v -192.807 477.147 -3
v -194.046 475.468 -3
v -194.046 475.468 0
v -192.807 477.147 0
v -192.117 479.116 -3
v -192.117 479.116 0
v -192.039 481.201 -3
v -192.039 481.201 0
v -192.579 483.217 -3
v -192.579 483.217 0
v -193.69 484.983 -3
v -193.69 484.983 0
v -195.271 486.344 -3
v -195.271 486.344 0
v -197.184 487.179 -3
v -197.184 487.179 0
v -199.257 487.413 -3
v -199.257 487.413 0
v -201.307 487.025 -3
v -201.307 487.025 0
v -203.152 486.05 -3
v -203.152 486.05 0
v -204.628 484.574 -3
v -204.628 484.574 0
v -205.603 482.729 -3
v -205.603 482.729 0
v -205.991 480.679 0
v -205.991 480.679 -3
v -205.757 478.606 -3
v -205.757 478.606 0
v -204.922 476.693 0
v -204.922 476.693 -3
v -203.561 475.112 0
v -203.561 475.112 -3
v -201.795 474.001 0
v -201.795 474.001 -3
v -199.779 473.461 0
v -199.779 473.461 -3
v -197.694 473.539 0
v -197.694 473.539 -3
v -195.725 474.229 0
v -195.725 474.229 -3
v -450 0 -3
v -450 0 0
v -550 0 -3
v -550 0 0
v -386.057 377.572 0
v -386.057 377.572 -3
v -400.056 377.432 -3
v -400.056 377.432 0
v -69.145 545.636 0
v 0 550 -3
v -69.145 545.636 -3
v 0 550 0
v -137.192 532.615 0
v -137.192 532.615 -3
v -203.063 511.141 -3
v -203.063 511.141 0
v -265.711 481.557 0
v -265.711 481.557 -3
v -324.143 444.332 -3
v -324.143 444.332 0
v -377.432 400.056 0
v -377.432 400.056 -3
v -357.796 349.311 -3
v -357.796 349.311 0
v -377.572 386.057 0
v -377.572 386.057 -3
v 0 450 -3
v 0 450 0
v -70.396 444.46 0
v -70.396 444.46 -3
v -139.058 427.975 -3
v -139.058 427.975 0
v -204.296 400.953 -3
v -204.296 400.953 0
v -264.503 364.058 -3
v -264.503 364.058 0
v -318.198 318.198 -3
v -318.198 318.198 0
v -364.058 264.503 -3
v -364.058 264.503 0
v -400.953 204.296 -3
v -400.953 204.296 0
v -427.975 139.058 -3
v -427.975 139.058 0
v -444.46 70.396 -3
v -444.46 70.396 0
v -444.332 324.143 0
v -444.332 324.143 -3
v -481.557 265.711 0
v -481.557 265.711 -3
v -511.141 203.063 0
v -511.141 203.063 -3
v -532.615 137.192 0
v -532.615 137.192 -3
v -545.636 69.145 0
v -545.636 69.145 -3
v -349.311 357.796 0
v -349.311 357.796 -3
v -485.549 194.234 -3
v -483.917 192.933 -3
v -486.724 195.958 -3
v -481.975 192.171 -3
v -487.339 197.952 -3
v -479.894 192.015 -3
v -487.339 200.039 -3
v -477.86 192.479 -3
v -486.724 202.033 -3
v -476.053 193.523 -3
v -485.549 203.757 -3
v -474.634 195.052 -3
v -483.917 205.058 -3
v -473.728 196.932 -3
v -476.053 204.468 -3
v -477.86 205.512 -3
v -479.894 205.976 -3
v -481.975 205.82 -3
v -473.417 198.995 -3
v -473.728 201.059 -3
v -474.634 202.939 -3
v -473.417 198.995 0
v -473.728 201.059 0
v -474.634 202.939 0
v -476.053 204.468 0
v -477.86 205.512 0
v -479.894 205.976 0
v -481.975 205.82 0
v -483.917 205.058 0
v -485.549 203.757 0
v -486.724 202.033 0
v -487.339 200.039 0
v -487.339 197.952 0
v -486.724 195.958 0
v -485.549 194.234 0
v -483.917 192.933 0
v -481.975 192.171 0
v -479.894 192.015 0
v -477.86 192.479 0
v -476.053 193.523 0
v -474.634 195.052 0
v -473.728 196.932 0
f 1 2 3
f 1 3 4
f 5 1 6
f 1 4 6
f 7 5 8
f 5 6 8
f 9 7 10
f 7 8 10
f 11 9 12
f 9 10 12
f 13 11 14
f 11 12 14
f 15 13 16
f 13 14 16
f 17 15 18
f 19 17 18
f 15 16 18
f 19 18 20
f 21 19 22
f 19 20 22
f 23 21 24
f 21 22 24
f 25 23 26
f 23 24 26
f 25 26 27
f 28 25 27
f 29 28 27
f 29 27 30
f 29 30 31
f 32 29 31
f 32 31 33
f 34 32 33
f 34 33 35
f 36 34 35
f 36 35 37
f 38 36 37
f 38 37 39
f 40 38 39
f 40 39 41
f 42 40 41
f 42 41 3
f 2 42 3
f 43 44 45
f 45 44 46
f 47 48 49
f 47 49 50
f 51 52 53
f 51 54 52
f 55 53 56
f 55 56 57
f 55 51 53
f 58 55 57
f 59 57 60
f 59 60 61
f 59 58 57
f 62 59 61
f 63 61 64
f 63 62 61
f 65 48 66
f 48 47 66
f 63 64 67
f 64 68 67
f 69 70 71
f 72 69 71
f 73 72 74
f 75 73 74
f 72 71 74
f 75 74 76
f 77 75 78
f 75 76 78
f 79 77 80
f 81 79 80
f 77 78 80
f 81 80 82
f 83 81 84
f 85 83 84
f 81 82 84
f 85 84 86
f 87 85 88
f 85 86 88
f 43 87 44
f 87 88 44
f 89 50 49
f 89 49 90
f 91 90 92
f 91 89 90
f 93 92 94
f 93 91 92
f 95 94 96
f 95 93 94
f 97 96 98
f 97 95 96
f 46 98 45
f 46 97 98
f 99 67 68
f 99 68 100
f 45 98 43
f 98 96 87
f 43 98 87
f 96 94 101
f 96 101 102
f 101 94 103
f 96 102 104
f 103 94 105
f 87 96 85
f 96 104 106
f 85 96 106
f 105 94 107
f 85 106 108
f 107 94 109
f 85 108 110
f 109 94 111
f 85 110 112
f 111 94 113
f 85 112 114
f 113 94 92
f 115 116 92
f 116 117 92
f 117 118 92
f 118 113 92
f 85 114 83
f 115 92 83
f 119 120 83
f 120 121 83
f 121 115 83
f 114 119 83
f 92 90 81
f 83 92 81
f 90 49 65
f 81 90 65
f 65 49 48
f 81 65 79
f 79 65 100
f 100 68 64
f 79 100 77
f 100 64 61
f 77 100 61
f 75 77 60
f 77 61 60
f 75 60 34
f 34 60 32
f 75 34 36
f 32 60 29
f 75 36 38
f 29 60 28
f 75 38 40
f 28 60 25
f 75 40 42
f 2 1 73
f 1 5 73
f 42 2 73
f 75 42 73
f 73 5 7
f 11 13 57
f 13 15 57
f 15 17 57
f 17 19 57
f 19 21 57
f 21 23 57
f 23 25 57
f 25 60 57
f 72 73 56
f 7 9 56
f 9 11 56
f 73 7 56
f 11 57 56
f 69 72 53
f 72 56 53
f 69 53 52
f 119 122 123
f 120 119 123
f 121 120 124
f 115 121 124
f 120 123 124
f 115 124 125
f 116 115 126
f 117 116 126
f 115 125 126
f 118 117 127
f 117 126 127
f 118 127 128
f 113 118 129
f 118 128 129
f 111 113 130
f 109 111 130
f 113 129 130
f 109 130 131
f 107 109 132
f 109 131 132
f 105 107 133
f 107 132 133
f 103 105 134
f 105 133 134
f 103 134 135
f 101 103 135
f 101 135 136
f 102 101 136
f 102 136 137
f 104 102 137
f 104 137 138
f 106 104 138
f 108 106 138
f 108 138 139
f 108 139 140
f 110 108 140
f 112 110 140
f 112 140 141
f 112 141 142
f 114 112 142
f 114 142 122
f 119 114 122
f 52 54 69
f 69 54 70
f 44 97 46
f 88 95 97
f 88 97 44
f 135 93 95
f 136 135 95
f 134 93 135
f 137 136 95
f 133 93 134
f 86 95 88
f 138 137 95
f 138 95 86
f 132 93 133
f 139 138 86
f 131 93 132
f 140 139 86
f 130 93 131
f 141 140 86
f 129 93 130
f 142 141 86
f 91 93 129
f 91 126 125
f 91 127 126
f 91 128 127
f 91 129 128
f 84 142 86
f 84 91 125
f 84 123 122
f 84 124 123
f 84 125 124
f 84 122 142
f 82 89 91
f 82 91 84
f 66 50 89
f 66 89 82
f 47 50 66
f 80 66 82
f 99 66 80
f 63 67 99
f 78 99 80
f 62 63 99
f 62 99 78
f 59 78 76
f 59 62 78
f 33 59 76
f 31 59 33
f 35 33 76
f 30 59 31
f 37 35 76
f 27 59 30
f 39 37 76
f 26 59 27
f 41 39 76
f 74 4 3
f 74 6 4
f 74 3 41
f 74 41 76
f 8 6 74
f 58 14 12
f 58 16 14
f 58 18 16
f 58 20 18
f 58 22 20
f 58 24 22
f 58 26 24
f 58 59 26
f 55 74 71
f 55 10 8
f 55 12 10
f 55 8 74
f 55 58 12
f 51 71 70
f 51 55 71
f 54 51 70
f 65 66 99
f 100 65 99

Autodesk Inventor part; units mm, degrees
ref_plane "YZ Plane" through (0, 0, 0) normal (1, 0, 0) x (0, 1, 0)
ref_plane "XZ Plane" through (0, 0, 0) normal (0, 1, 0) x (-1, 0, 0)
ref_plane "XY Plane" through (0, 0, 0) normal (0, 0, 1) x (1, 0, 0)
sketch "Sketch1" plane through (0, 0, 0) normal (0, 0, 1) x (1, 0, 0)
  arc A0 (0, 550) -> (-550, 0) centre (0, 0) ccw
  arc A1 (0, 450) -> (-450, 0) centre (0, 0) ccw
  line L0 (0, 550) -> (0, 450)
  line L1 (-450, 0) -> (-550, 0)
  point P0 (-500, 0)
  point P1 (0, 500)
  dimension "d0" = 1100
  dimension "d1" = 900
extrude "Plate1" add sketch "Sketch1" against normal blind 3
sketch "Sketch2" plane through (0, 0, 0) normal (0, 0, 1) x (1, 0, 0)
  line L0 (-550, 0) -> (-450, 0) projected
  arc A0 (0, 550) -> (-550, 0) centre (0, 0) ccw construction
  circle A1 centre (-480.4174, 198.9954) radius 7
  arc A2 (0, 450) -> (-450, 0) centre (0, 0) ccw construction
  circle A3 centre (0, 0) radius 520 construction
  line L1 (-480.4174, 198.9954) -> (0, 0) construction
  dimension "d17" = 1040
  dimension "d4" = 14
  dimension "d16" = 22.5
extrude "Cut1" cut sketch "Sketch2" against normal through all
pattern_circular "Circular Pattern1" count 2 over 45 about axis through (0, 0, 0) along (0, 0, -1) of "Cut1"
sketch "Sketch3" plane through (0, 0, 0) normal (0, 0, 1) x (1, 0, 0)
  line L0 (-388.9087, 388.9087) -> (-318.1981, 318.1981) construction
  arc A0 (0, 450) -> (-450, 0) centre (0, 0) ccw projected
  arc A1 (0, 550) -> (-550, 0) centre (0, 0) ccw projected
  line L1 (-550, 0) -> (-450, 0) projected
  line L2 (-384.6661, 393.1514) -> (-393.1514, 384.6661)
  line L3 (-384.6661, 393.1514) -> (-349.3107, 357.796)
  line L4 (-393.1514, 384.6661) -> (-357.796, 349.3107)
  line L5 (-357.796, 349.3107) -> (-349.3107, 357.796)
  point P0 (-388.9087, 388.9087)
  dimension "d11" = 45
  dimension "d12" = 12
  dimension "d13" = 50
extrude "Extrusion1" cut sketch "Sketch3" against normal through all
chamfer "Corner Chamfer1" distance 10 angle 45 2 edges at (-384.6429, 393.1282, -1.5) (-393.1282, 384.6429, -1.5)
equation "\"d0\" = Диаметр_вн"
equation "\"d1\" = d0 - 2 * Ширина_кольца"
equation "\"d4\" = Диаметр_отв"
equation "\"d6\" = Thickness"
equation "\"d2\" = Thickness"
equation "\"BendReliefWidth\" = Thickness"
equation "\"BendReliefDepth\" = 0.5 * Thickness"
equation "\"CornerReliefSize\" = 4 * Thickness"
equation "\"MinimumRemnant\" = 2 * Thickness"
equation "\"TransitionRadius\" = BendRadius"
equation "\"JacobiRadiusSize\" = BendRadius"
equation "\"GapSize\" = Thickness"
equation "\"Диаметр_вн\" = 1100"
equation "\"Ширина_кольца\" = 100"
equation "\"Диаметр_отв\" = 14"
equation "\"Thickness\" = 3"
equation "\"BendRadius\" = 5"
properties part number "BSH 502 segment" material "Stainless Steel"
